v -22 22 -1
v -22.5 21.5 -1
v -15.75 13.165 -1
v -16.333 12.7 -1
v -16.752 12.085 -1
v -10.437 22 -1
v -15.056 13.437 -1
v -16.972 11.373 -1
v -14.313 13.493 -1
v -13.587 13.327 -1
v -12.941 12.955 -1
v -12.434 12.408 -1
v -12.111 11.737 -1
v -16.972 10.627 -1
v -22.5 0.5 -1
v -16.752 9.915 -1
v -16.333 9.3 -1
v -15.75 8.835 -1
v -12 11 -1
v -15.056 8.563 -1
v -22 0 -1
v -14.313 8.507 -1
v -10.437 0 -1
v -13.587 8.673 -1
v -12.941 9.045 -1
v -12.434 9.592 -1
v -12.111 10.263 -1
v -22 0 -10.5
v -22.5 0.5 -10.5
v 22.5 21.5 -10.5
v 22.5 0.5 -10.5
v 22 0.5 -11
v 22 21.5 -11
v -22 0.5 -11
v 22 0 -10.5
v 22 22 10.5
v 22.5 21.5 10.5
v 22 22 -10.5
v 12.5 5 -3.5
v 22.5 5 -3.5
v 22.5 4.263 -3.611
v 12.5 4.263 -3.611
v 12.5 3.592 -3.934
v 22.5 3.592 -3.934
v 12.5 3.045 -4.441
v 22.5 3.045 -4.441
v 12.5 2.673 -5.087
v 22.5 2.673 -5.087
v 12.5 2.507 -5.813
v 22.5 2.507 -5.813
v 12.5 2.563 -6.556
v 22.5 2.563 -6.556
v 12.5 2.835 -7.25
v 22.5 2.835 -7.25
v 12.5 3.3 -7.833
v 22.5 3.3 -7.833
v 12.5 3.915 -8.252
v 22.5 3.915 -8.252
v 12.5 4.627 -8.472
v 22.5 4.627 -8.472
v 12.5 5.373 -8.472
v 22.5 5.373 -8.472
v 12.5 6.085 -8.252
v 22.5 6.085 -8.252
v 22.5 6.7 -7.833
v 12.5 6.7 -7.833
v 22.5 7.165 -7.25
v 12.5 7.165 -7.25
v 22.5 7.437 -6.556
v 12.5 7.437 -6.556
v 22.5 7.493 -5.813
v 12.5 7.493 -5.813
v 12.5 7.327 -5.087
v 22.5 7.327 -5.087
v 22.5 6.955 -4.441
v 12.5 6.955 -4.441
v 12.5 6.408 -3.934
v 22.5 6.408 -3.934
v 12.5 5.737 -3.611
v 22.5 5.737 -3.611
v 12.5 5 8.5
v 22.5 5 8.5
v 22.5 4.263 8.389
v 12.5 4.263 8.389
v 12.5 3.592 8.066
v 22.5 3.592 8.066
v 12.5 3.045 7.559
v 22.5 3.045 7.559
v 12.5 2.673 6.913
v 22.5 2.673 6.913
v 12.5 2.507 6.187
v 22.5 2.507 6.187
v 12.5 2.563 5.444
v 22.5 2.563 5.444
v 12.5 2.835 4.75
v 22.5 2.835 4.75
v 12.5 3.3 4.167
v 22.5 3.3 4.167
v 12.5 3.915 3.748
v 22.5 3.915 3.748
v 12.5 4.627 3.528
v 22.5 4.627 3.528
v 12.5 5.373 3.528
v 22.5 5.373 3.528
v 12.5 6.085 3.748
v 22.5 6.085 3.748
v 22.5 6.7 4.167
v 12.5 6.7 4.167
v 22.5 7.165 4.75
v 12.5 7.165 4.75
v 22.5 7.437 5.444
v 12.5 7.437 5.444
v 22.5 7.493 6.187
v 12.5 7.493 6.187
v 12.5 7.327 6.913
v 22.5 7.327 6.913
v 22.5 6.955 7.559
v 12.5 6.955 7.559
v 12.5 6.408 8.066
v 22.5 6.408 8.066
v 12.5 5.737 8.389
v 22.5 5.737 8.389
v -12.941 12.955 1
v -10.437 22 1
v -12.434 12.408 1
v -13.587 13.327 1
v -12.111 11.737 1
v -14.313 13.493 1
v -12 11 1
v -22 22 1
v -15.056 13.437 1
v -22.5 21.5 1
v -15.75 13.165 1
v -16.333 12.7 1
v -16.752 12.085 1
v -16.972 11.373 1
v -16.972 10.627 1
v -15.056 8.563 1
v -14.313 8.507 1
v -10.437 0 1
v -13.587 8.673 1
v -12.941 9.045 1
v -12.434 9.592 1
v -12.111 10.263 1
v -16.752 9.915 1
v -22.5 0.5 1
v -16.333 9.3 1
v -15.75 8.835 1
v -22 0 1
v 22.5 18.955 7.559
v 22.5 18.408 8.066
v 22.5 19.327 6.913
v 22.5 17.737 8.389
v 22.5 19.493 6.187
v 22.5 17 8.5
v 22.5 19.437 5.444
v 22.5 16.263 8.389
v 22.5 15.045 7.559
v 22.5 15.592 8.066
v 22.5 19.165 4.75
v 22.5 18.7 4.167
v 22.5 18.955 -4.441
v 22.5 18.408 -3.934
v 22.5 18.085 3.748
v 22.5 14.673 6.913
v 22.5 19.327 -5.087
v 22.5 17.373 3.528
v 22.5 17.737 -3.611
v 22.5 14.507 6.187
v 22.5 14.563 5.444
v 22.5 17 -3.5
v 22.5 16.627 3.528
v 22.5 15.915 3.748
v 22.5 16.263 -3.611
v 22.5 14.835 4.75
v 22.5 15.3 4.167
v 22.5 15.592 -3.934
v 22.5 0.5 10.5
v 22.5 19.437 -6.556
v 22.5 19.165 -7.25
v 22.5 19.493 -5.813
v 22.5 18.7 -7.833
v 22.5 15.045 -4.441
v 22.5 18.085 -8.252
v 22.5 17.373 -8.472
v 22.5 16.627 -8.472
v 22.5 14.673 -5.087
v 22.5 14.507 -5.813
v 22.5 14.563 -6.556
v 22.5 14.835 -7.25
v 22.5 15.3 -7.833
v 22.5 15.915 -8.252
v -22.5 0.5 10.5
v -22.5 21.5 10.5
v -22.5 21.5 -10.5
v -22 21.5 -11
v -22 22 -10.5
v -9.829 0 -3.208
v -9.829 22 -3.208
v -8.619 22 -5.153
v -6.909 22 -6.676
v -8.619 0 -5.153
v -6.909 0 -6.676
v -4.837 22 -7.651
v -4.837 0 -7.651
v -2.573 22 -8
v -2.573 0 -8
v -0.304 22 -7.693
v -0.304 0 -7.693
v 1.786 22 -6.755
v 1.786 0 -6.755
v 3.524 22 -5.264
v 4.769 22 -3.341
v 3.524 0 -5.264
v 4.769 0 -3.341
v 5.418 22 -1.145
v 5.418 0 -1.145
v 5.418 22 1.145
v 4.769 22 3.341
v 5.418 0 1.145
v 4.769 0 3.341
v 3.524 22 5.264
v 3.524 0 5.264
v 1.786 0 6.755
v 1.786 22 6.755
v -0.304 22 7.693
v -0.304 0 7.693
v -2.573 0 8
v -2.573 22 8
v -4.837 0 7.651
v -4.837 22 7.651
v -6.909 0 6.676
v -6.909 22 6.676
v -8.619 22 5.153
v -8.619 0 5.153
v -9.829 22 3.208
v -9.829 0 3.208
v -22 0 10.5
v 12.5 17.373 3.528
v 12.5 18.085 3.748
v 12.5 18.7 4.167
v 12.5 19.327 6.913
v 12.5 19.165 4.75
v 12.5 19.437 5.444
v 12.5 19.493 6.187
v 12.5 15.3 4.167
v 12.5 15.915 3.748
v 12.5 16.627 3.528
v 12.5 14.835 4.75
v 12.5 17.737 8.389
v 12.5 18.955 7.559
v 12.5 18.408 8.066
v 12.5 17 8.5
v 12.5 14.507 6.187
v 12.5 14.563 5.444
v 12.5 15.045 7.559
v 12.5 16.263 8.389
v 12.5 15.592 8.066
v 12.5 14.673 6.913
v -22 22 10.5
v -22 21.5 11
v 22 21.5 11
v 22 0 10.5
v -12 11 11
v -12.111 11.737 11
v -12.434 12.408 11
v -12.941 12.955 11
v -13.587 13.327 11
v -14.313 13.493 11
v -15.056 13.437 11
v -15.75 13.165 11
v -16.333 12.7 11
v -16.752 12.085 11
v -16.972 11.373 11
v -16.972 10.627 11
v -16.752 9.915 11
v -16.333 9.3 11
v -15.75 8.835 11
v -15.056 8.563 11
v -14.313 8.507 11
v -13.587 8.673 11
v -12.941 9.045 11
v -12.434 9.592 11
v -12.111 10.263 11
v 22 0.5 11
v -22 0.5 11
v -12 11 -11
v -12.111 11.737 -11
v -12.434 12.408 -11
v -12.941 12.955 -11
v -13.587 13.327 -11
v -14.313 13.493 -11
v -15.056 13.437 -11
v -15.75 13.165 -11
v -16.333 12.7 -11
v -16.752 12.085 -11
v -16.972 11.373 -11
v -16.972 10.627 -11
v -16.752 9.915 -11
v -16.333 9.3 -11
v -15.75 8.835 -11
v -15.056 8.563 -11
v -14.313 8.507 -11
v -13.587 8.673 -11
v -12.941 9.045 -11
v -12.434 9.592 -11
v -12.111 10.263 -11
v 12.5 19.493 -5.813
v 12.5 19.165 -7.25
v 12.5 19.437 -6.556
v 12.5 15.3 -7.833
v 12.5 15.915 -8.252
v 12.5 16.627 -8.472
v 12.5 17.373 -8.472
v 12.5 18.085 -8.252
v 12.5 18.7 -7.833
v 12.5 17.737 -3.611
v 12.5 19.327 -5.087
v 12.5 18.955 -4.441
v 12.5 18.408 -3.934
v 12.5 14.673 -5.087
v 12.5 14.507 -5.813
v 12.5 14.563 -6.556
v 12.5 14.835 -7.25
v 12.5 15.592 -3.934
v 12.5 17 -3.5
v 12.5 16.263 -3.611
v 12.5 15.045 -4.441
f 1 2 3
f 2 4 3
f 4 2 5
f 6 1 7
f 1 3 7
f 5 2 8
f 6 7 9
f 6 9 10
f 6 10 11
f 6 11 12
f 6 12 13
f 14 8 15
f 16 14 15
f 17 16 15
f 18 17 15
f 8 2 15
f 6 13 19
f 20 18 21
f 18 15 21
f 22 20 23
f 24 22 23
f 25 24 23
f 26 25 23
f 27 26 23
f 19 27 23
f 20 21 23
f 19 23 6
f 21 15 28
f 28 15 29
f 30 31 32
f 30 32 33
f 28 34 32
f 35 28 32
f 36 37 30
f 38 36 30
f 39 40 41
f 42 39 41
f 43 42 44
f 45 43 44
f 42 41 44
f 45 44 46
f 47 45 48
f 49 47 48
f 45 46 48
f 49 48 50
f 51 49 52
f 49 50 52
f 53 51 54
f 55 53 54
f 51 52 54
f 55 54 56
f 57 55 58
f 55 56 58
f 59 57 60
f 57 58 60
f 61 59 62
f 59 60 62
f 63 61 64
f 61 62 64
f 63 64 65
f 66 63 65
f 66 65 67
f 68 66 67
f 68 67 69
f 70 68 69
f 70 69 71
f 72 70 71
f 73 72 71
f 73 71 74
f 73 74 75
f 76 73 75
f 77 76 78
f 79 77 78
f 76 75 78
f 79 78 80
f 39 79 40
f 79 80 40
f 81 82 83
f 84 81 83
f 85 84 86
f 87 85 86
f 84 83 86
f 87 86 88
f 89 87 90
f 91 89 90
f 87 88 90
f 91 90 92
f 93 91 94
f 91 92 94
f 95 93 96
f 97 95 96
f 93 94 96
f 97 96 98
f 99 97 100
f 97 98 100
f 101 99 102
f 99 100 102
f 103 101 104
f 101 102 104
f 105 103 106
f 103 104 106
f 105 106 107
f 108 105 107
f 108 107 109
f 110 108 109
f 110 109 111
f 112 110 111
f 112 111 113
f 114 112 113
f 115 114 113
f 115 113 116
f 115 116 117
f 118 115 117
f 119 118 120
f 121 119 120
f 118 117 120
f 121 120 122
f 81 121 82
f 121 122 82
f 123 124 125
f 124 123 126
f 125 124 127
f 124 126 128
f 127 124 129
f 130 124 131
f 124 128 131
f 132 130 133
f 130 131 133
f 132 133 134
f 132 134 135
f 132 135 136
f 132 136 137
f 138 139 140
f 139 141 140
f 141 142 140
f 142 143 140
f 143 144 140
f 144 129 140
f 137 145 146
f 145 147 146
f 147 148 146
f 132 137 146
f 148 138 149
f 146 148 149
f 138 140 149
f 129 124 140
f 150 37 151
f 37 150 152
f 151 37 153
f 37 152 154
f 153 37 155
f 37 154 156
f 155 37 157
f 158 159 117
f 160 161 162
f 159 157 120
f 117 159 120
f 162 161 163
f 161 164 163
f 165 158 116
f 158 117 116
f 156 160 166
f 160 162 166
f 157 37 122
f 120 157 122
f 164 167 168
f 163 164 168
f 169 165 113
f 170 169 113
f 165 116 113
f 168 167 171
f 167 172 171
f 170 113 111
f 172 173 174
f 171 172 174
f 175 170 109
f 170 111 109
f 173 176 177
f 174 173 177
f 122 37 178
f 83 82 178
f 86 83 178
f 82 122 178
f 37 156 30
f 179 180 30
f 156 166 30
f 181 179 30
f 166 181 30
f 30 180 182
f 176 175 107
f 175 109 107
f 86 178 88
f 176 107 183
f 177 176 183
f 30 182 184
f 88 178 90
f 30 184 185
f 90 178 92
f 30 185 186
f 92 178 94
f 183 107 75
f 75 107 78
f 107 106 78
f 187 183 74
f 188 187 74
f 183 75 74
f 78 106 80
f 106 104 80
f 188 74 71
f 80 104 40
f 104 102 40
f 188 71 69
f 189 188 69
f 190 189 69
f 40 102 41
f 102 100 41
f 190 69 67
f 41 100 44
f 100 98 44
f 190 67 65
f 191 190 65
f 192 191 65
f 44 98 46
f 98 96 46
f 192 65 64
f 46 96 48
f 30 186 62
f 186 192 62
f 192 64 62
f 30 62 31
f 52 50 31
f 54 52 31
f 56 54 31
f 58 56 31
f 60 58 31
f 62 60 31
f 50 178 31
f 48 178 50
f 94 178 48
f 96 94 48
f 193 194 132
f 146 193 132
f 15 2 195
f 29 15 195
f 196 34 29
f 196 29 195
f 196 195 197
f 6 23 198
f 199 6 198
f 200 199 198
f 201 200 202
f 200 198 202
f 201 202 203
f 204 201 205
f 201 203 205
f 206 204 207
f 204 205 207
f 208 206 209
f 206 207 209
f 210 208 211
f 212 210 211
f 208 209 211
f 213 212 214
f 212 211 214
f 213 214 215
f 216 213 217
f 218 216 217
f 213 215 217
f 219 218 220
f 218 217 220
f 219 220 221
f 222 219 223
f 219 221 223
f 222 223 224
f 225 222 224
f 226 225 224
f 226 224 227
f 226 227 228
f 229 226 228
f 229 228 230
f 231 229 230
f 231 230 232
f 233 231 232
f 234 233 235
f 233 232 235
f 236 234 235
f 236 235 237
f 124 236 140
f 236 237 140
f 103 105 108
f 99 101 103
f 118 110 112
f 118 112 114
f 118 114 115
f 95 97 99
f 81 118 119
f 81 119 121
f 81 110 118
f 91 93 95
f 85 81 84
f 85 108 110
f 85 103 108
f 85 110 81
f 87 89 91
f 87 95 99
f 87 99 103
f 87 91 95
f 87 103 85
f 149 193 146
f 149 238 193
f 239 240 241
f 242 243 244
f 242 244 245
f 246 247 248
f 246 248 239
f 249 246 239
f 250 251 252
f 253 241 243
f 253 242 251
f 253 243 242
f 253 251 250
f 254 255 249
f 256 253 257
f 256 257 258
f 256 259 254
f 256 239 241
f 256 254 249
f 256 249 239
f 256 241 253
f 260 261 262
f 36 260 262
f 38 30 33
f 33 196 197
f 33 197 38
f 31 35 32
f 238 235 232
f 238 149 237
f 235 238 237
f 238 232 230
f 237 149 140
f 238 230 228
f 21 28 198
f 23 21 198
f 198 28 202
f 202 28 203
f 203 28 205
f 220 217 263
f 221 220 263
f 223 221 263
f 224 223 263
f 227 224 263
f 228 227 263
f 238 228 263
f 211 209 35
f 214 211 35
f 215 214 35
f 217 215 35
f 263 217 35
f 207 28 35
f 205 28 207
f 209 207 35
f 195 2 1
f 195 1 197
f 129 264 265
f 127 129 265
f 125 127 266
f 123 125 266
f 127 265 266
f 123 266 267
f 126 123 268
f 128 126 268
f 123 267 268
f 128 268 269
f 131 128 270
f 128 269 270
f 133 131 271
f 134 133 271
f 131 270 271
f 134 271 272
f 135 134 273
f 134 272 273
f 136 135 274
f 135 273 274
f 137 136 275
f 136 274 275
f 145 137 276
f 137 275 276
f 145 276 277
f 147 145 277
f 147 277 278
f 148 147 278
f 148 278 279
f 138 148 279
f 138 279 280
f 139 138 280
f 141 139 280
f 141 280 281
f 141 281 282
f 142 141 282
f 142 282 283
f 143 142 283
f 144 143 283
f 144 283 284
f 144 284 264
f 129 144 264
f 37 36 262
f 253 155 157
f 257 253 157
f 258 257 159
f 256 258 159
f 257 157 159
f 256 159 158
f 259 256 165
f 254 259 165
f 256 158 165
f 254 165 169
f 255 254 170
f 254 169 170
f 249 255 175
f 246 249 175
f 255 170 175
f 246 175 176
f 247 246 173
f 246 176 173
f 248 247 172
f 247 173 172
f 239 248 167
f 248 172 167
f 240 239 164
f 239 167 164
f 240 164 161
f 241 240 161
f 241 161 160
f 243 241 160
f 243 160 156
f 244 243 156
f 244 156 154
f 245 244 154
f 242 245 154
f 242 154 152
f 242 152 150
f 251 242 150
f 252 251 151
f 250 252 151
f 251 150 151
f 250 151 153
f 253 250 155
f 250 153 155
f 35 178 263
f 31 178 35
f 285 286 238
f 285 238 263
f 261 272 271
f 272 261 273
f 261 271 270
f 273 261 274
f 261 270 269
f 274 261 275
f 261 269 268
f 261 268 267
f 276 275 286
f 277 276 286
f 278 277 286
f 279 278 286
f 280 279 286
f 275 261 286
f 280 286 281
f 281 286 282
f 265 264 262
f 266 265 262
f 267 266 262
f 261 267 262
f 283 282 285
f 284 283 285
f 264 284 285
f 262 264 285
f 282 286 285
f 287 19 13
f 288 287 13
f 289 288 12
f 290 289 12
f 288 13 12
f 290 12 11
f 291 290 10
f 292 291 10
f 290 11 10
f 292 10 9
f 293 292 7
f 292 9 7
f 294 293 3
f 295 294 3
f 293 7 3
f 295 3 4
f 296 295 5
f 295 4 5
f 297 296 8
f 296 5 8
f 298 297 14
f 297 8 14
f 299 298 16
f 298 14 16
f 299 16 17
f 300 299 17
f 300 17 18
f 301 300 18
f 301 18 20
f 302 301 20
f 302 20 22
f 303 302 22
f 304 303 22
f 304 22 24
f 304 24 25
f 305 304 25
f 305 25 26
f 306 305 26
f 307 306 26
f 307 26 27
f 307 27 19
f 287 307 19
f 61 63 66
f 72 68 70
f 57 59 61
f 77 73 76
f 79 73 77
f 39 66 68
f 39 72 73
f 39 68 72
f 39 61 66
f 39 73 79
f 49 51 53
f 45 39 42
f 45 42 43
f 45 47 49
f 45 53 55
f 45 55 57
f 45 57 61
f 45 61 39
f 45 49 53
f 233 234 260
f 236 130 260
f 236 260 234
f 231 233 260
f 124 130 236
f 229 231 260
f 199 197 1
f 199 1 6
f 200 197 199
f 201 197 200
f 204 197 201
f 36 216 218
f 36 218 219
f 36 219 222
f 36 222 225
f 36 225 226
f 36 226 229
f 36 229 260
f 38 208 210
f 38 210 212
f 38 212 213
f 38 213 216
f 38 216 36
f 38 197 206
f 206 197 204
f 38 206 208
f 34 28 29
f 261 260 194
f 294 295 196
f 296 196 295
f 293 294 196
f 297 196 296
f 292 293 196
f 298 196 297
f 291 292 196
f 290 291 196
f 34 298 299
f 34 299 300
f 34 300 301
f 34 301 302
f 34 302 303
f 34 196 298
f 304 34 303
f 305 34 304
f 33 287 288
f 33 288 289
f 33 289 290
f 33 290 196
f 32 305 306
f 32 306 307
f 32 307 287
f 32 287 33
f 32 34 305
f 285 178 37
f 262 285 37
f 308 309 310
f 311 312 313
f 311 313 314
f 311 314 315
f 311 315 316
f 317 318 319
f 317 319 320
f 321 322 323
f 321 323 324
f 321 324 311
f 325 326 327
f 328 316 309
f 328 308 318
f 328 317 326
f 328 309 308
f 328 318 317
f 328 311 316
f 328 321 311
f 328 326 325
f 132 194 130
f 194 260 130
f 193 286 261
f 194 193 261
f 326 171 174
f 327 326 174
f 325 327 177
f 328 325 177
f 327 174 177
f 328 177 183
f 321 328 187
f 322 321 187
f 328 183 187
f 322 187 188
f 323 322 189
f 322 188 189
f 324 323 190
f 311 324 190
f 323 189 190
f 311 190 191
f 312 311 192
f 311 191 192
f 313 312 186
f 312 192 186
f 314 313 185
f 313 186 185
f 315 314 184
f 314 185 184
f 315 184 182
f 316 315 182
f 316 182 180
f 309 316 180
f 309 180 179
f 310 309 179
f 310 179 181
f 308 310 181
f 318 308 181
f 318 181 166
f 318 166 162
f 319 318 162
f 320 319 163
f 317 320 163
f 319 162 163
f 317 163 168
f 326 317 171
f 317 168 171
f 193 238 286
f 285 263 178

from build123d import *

# Parameters (mm, degrees)
SKETCH_5_W          = 45
SKETCH_5_H          = 22
EXTRUDE_2_DEPTH     = 22
CUT_EXTRUDE_3_DEPTH = 22
CUT_EXTRUDE_START   = 22.5
SKETCH_7_R          = 2.5
CUT_EXTRUDE_4_DEPTH = 10
CUT_EXTRUDE_START_2 = 11
SKETCH_8_R          = 2.5
CUT_EXTRUDE_5_DEPTH = 22
CHAMFER_1_SIZE      = 0.5


with BuildPart() as part:
    # 草图5 → 凸台-拉伸2 (new body)
    with BuildSketch(Plane(origin=(0, 0, 0), x_dir=(1, 0, 0), z_dir=(0, 1, 0))):
        Rectangle(SKETCH_5_W, SKETCH_5_H)
    extrude(amount=EXTRUDE_2_DEPTH)

    # 草图6 → 切除-拉伸3 (cut)
    with BuildSketch(Plane(origin=(0, 0, 0), x_dir=(1, 0, 0), z_dir=(0, 1, 0))):
        with BuildLine():
            Line((-22.5, -1), (-22.5, 1))
            Line((-22.5, 1), (-10.437253933, 1))
            ThreePointArc((-10.437253933, 1), (5.5, 0), (-10.437253933, -1))
            Line((-10.437253933, -1), (-22.5, -1))
        make_face()
    extrude(amount=CUT_EXTRUDE_3_DEPTH, mode=Mode.SUBTRACT)

    # 草图7 → 切除-拉伸4 (cut)
    with BuildSketch(Plane(origin=(0, 0, 0), x_dir=(0, 0, -1), z_dir=(1, 0, 0)).offset(CUT_EXTRUDE_START)):
        with Locations(Location((-6, 17, 0), (0, 0, 180))):
            Circle(SKETCH_7_R)
        with Locations(Location((-6, 5, 0), (0, 0, 180))):
            Circle(SKETCH_7_R)
        with Locations(Location((6, 17, 0), (0, 0, 180))):
            Circle(SKETCH_7_R)
        with Locations(Location((6, 5, 0), (0, 0, 180))):
            Circle(SKETCH_7_R)
    extrude(amount=-CUT_EXTRUDE_4_DEPTH, mode=Mode.SUBTRACT)

    # 草图8 → 切除-拉伸5 (cut)
    with BuildSketch(Plane.XY.offset(CUT_EXTRUDE_START_2)):
        with Locations((-14.5, 11)):
            Circle(SKETCH_8_R)
    extrude(amount=-CUT_EXTRUDE_5_DEPTH, mode=Mode.SUBTRACT)

    # 倒角1
    chamfer_1_edges = [part.edges().sort_by_distance(p)[0] for p in [
        (-22.5, 22, -6),
        (-22.5, 0, 6),
        (-22.5, 22, 6),
        (0, 22, 11),
        (22.5, 22, 0),
        (0, 0, 11),
        (-22.5, 0, -6),
        (0, 0, -11),
        (22.5, 0, 0),
        (22.5, 11, 11),
        (-22.5, 11, 11),
        (-22.5, 11, -11),
        (22.5, 11, -11),
        (0, 22, -11),
    ]]
    chamfer(chamfer_1_edges, length=CHAMFER_1_SIZE)


solid = part.part
